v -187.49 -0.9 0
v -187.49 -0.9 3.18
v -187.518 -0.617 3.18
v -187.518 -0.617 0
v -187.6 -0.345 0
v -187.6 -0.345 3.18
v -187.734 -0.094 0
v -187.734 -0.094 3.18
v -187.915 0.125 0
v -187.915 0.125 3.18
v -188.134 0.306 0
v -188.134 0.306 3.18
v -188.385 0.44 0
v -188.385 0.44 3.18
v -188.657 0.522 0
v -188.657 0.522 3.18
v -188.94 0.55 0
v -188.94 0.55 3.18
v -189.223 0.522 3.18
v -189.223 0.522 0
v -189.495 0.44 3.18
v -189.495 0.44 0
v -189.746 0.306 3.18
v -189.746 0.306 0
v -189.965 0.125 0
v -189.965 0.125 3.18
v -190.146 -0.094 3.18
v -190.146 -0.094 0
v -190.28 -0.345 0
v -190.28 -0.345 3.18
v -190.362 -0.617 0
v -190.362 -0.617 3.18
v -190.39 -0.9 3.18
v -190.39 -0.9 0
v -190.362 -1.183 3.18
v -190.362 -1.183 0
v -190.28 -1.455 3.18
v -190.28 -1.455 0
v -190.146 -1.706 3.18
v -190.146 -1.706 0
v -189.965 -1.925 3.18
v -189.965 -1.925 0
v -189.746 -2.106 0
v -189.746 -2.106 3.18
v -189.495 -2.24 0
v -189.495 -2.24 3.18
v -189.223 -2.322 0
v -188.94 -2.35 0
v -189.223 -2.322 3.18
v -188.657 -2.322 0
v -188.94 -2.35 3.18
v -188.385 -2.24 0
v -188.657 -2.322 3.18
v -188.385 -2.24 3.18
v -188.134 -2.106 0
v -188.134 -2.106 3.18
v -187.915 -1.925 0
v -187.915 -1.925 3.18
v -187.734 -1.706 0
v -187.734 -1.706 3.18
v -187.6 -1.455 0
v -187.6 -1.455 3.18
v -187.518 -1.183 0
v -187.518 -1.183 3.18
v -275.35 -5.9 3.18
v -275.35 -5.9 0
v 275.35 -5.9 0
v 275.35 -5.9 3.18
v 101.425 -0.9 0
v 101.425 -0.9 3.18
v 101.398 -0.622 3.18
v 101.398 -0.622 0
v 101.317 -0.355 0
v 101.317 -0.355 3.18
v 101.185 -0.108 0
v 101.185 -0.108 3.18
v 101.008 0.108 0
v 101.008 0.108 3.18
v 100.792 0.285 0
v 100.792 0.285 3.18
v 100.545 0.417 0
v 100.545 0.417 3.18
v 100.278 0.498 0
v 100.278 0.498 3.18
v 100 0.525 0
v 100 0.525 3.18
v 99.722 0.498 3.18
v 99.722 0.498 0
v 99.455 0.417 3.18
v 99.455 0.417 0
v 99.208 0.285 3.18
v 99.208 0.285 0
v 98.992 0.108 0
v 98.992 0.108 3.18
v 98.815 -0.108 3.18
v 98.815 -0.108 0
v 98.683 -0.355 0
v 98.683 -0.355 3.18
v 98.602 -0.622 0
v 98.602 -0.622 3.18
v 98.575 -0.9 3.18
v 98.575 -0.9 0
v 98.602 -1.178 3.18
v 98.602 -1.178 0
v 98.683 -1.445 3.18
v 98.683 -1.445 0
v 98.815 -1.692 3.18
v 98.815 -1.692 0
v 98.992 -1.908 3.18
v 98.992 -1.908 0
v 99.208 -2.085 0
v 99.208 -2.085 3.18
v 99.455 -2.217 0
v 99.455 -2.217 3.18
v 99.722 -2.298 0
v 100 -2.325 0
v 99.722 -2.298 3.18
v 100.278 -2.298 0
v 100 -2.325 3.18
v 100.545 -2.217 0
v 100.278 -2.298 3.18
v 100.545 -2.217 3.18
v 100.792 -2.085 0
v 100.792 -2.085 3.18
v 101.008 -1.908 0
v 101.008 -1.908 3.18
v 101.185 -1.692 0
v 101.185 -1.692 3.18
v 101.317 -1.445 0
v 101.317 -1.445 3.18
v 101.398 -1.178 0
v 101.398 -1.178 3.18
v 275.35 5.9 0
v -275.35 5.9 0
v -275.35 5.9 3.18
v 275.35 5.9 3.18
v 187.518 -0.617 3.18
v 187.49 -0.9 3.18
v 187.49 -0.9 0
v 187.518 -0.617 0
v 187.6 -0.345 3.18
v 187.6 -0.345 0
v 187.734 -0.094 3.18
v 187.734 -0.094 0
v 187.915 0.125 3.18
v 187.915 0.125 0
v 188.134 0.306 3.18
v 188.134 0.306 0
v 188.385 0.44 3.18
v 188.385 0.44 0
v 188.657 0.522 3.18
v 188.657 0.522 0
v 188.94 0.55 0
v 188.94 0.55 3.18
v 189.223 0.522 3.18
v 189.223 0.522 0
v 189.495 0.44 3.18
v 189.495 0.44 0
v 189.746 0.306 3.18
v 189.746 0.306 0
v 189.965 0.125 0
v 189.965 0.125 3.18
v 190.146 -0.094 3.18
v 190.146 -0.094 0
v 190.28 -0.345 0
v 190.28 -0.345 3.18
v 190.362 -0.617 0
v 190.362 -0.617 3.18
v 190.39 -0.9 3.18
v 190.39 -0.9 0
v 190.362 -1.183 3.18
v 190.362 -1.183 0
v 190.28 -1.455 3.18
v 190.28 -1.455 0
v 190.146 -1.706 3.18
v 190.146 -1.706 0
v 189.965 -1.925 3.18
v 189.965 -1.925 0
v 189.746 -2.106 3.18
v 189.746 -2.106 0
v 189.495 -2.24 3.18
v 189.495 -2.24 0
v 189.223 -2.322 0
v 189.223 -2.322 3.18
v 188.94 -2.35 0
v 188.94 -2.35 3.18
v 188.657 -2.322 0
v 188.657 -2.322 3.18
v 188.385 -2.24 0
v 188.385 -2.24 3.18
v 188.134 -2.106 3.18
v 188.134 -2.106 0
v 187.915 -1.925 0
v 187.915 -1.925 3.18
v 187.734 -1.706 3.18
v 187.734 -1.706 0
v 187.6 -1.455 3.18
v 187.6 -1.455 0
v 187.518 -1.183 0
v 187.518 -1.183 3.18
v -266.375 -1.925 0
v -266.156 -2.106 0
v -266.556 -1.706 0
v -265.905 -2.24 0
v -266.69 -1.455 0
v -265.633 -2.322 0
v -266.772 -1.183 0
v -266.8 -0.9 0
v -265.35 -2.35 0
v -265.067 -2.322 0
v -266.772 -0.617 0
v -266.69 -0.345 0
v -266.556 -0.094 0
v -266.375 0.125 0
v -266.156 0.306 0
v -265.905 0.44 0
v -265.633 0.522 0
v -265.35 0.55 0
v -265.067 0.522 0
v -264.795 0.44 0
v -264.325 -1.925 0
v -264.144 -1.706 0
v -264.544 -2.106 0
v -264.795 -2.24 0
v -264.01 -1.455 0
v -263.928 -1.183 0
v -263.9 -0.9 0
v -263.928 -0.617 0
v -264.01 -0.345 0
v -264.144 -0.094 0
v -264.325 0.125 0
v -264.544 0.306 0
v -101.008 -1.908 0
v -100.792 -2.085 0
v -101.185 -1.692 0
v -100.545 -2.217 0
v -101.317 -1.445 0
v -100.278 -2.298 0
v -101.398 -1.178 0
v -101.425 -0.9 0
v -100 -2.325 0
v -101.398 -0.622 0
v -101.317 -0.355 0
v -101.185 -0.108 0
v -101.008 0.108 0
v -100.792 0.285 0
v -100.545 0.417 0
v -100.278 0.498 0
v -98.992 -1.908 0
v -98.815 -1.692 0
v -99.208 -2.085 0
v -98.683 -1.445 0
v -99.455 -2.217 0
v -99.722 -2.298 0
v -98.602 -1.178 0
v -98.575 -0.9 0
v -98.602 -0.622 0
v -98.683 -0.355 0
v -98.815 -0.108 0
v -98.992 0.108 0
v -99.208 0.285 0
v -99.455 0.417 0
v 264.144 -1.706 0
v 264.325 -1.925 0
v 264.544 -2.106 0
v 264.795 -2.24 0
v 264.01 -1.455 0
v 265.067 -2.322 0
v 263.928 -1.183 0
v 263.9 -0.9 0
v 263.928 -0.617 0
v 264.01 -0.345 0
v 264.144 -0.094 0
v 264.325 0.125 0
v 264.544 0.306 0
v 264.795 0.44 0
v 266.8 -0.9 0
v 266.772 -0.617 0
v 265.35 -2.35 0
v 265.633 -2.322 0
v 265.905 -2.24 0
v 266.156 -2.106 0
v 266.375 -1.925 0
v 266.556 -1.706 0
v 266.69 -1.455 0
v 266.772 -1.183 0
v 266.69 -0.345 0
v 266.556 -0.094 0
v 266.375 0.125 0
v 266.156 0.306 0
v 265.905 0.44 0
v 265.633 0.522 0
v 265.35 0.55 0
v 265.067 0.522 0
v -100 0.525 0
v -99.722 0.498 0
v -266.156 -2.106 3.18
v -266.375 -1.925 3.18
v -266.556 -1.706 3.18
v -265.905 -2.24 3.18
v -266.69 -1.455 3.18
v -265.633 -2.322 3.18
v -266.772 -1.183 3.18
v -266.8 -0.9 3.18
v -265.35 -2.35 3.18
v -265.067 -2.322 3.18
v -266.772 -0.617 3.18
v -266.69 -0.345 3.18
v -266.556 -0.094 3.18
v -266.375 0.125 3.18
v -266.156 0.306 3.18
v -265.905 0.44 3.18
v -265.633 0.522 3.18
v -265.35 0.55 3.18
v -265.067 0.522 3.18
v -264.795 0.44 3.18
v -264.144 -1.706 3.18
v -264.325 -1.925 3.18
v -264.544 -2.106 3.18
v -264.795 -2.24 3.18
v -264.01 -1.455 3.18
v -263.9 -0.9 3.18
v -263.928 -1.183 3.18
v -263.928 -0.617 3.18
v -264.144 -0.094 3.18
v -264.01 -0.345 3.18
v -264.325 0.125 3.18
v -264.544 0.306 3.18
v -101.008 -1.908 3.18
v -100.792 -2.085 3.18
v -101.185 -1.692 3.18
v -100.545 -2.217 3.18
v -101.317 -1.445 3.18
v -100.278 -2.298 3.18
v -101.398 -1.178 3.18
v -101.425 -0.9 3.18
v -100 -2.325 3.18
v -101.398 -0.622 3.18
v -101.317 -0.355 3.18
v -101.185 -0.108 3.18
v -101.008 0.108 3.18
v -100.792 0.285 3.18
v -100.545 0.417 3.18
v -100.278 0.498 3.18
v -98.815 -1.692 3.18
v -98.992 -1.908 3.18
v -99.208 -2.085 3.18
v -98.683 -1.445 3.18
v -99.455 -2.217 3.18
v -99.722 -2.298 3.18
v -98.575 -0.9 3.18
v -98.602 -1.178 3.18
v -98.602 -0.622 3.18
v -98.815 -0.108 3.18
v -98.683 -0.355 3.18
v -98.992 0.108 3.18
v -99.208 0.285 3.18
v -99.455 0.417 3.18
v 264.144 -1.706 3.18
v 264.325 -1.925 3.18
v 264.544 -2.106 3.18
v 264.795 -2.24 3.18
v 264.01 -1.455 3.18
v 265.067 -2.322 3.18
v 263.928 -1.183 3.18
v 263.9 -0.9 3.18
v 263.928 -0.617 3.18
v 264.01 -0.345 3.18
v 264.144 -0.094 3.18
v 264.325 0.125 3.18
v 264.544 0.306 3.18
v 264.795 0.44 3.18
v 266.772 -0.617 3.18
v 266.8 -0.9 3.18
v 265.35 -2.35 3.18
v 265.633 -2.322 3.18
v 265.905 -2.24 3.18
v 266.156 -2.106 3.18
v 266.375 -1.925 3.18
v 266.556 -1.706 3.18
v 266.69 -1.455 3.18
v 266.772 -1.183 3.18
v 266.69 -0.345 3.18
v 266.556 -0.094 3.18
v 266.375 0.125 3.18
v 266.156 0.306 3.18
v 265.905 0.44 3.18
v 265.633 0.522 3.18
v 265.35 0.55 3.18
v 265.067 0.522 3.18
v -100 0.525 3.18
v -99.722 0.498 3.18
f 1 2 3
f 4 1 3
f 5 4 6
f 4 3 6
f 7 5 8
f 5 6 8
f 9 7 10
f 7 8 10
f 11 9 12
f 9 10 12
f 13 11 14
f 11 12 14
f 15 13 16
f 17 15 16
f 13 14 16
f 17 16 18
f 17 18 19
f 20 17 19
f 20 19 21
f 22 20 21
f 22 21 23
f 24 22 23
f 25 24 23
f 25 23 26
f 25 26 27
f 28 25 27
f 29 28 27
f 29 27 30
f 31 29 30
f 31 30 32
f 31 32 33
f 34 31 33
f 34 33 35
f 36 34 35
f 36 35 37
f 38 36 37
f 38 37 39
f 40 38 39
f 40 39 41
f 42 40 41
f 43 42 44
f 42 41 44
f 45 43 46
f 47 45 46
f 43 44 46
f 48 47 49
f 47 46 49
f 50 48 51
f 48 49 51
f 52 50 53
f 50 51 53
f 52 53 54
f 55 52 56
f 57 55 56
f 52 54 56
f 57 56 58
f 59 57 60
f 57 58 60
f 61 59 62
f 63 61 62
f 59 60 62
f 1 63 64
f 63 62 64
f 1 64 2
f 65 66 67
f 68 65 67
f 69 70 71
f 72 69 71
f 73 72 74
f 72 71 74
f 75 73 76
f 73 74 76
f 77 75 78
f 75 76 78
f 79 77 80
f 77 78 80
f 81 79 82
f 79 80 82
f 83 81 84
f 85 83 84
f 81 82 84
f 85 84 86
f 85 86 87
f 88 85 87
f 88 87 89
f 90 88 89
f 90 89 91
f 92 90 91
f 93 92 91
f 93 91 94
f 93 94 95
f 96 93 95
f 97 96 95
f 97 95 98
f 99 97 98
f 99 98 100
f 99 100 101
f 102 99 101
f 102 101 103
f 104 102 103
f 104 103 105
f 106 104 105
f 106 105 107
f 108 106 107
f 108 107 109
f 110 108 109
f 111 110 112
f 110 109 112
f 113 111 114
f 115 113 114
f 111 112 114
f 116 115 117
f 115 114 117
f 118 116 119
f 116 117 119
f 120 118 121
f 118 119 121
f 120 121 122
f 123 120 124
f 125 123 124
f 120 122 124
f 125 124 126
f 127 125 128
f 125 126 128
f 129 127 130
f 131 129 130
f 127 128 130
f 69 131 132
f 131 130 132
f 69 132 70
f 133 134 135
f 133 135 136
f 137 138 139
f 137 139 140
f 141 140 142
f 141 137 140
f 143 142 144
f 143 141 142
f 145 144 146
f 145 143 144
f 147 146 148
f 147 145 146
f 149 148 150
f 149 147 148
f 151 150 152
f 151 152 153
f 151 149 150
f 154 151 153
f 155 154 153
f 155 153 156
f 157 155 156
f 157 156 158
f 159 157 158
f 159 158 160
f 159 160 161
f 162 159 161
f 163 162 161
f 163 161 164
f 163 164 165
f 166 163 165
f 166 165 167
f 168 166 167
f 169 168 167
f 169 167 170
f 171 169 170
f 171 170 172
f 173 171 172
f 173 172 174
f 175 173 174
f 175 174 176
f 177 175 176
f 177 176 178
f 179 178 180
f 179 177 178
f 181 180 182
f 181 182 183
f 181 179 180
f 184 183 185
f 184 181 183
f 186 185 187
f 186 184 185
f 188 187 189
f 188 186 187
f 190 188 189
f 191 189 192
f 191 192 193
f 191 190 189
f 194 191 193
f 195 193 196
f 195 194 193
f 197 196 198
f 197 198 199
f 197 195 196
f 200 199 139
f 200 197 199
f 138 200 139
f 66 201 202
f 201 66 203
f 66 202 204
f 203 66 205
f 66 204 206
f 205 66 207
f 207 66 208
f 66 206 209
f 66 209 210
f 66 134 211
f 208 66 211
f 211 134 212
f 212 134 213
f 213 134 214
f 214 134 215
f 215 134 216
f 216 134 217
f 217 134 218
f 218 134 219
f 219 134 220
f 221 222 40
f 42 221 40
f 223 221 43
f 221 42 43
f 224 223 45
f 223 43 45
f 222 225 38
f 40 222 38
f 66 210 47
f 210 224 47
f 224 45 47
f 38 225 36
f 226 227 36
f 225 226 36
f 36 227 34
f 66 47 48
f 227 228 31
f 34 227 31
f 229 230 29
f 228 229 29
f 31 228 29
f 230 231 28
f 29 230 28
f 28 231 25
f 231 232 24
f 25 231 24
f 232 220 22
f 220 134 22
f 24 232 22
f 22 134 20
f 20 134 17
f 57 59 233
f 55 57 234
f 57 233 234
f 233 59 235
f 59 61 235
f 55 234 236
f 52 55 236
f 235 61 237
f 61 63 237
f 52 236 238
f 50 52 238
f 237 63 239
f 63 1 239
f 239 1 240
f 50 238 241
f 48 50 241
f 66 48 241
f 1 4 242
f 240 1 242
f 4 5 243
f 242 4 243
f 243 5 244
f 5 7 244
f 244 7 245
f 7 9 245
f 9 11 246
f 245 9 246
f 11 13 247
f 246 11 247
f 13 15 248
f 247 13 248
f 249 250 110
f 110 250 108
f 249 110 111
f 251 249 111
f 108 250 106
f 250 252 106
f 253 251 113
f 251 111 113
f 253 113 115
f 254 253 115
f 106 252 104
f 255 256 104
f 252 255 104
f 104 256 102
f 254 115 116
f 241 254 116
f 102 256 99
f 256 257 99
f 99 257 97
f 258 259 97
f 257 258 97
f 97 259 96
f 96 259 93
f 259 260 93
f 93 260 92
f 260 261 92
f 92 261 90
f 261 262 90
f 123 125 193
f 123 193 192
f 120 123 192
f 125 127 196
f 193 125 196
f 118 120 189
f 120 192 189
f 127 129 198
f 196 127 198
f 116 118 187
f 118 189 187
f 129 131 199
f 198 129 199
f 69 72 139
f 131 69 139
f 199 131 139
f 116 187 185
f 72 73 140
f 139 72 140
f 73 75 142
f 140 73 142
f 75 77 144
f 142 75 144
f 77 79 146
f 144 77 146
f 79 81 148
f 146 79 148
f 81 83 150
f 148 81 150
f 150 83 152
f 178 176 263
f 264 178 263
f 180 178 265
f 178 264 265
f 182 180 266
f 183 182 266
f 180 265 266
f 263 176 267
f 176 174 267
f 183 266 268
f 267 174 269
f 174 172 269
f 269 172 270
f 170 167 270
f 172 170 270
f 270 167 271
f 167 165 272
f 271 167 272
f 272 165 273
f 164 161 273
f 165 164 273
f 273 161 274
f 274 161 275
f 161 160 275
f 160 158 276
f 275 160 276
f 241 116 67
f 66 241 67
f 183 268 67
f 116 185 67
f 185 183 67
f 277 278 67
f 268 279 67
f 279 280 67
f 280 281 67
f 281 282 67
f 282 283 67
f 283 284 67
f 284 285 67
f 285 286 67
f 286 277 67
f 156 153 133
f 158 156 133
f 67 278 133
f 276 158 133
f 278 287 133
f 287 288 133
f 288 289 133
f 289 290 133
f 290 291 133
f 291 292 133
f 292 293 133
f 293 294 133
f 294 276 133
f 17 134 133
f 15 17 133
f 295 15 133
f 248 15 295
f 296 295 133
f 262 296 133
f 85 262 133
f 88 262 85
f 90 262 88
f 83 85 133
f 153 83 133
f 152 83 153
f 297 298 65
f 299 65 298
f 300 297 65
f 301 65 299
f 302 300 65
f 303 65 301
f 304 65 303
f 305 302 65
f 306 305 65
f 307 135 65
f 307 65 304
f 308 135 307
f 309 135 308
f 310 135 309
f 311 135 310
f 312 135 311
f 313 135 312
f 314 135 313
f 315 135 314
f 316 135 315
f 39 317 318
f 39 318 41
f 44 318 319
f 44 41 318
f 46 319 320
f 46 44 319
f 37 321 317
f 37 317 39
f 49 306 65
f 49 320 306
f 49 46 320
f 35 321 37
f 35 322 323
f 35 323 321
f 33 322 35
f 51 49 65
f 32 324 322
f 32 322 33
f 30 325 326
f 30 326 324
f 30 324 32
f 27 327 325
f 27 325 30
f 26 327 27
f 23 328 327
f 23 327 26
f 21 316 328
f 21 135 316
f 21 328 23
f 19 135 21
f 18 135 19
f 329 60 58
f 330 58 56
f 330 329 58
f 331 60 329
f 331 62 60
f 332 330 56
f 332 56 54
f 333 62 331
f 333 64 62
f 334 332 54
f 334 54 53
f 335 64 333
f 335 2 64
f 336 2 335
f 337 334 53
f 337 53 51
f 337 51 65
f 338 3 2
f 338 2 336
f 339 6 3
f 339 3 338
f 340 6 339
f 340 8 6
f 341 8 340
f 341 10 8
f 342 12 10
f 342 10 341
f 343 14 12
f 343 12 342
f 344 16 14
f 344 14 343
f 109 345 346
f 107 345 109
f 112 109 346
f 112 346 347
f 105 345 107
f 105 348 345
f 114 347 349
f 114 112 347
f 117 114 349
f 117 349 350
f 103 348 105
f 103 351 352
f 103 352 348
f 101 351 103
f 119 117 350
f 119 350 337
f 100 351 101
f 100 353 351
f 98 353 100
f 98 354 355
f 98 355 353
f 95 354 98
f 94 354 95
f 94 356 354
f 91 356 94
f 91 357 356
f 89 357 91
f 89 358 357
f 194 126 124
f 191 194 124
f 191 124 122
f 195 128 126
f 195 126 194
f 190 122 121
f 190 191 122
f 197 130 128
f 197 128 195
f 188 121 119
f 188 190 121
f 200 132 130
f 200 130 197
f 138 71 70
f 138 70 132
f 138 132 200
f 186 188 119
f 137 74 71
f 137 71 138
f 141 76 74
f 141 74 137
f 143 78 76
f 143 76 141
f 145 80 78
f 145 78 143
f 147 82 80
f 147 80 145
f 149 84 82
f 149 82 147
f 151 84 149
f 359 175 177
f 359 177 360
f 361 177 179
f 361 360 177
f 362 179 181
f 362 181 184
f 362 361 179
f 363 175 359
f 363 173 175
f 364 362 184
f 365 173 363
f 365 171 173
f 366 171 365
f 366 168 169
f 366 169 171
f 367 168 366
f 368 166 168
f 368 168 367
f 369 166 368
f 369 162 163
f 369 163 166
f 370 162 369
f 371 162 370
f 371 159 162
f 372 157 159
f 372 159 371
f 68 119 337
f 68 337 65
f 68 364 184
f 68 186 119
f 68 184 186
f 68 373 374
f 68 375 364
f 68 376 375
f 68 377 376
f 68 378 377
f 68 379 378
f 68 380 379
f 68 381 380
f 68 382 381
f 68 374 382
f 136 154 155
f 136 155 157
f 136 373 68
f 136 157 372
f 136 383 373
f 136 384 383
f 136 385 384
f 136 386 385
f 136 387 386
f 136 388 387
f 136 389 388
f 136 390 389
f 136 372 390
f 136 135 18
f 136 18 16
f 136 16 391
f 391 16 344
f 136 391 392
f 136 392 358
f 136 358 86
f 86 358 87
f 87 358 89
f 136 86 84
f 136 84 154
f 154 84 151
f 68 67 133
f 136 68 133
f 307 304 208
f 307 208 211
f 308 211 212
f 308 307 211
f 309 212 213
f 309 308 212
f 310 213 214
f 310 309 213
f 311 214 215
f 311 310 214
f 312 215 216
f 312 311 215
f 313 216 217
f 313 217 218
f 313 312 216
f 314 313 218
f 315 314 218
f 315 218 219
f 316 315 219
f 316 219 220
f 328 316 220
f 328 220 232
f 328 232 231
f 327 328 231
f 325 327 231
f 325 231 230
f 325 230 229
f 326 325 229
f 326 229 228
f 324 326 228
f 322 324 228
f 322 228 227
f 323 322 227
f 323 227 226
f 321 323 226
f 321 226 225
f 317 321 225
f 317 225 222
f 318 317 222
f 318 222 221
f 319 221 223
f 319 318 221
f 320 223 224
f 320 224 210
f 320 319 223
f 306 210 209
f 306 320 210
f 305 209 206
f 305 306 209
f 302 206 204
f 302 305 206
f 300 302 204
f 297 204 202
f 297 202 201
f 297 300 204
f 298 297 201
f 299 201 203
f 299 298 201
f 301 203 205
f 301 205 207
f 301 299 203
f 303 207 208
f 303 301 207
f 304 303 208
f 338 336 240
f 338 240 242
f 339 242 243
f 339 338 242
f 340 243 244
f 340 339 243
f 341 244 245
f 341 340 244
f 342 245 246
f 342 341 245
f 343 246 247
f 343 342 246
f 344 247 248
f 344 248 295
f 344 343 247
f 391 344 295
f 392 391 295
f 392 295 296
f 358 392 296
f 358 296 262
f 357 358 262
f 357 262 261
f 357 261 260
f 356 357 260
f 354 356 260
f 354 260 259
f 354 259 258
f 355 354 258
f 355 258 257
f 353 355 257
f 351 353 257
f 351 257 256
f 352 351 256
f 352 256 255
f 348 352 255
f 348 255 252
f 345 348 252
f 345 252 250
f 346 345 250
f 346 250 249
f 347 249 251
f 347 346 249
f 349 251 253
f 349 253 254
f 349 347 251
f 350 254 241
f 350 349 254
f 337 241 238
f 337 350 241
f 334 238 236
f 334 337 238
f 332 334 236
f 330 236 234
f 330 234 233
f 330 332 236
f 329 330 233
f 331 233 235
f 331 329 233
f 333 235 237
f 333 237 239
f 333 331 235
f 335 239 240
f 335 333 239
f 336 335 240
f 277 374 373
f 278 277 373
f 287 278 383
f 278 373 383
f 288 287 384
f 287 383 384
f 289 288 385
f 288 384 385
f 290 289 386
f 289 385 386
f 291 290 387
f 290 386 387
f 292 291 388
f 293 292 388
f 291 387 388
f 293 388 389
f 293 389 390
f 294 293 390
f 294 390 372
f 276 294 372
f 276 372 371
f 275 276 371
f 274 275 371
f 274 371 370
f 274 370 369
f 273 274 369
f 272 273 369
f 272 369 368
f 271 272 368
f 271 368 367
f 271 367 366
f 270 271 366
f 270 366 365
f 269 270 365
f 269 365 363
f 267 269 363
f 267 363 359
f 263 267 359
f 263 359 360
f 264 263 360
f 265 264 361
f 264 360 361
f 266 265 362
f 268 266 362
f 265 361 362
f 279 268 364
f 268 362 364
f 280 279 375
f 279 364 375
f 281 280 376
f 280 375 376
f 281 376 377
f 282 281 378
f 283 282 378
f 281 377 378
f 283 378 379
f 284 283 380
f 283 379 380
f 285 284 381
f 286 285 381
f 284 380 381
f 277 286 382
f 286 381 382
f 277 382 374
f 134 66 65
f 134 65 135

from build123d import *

# Parameters (mm, degrees)
SKETCH1_W           = 550.7
SKETCH1_H           = 11.8
BOSS_EXTRUDE1_DEPTH = 3.18
CUT_EXTRUDE2_REACH  = 277.432
SKETCH3_R           = 1.425
CUT_EXTRUDE3_REACH  = 277.432
SKETCH2_R           = 1.45
CUT_EXTRUDE4_REACH  = 277.432
SKETCH4_R           = 1.45


with BuildPart() as part:
    # Sketch1 → Boss-Extrude1 (new body)
    with BuildSketch(Plane.XY):
        Rectangle(SKETCH1_W, SKETCH1_H)
    extrude(amount=BOSS_EXTRUDE1_DEPTH)

    # Sketch3 → Cut-Extrude2 (cut, up to next)
    with BuildSketch(Plane.XY.offset(3.18), mode=Mode.PRIVATE) as cut_extrude2_sk1:
        with Locations((100, -0.9)):
            Circle(SKETCH3_R)
    cut_extrude2_tool1 = extrude(cut_extrude2_sk1.sketch, amount=-CUT_EXTRUDE2_REACH, mode=Mode.PRIVATE) & part.part
    cut_extrude2 = cut_extrude2_tool1.solids().sort_by_distance((100, -0.9, 3.18))[0]
    add(cut_extrude2, mode=Mode.SUBTRACT)

    # Mirror2: Cut-Extrude2 across plane
    add(cut_extrude2.mirror(Plane(origin=(0, 0, 0), x_dir=(0, 0, 1), z_dir=(1, 0, 0))), mode=Mode.SUBTRACT)

    # Sketch2 → Cut-Extrude3 (cut, up to next)
    with BuildSketch(Plane.XY.offset(3.18), mode=Mode.PRIVATE) as cut_extrude3_sk1:
        with Locations((265.35, -0.9)):
            Circle(SKETCH2_R)
    cut_extrude3_tool1 = extrude(cut_extrude3_sk1.sketch, amount=-CUT_EXTRUDE3_REACH, mode=Mode.PRIVATE) & part.part
    cut_extrude3 = cut_extrude3_tool1.solids().sort_by_distance((265.35, -0.9, 3.18))[0]
    add(cut_extrude3, mode=Mode.SUBTRACT)

    # Mirror3: Cut-Extrude3 across plane
    add(cut_extrude3.mirror(Plane(origin=(0, 0, 0), x_dir=(0, 0, 1), z_dir=(1, 0, 0))), mode=Mode.SUBTRACT)

    # Sketch4 → Cut-Extrude4 (cut, up to next)
    with BuildSketch(Plane.XY.offset(3.18), mode=Mode.PRIVATE) as cut_extrude4_sk1:
        with Locations((-188.94, -0.9)):
            Circle(SKETCH4_R)
    cut_extrude4_tool1 = extrude(cut_extrude4_sk1.sketch, amount=-CUT_EXTRUDE4_REACH, mode=Mode.PRIVATE) & part.part
    cut_extrude4 = cut_extrude4_tool1.solids().sort_by_distance((-188.94, -0.9, 3.18))[0]
    add(cut_extrude4, mode=Mode.SUBTRACT)

    # Mirror4: Cut-Extrude4 across plane
    add(cut_extrude4.mirror(Plane(origin=(0, 0, 0), x_dir=(0, 0, 1), z_dir=(1, 0, 0))), mode=Mode.SUBTRACT)


solid = part.part
